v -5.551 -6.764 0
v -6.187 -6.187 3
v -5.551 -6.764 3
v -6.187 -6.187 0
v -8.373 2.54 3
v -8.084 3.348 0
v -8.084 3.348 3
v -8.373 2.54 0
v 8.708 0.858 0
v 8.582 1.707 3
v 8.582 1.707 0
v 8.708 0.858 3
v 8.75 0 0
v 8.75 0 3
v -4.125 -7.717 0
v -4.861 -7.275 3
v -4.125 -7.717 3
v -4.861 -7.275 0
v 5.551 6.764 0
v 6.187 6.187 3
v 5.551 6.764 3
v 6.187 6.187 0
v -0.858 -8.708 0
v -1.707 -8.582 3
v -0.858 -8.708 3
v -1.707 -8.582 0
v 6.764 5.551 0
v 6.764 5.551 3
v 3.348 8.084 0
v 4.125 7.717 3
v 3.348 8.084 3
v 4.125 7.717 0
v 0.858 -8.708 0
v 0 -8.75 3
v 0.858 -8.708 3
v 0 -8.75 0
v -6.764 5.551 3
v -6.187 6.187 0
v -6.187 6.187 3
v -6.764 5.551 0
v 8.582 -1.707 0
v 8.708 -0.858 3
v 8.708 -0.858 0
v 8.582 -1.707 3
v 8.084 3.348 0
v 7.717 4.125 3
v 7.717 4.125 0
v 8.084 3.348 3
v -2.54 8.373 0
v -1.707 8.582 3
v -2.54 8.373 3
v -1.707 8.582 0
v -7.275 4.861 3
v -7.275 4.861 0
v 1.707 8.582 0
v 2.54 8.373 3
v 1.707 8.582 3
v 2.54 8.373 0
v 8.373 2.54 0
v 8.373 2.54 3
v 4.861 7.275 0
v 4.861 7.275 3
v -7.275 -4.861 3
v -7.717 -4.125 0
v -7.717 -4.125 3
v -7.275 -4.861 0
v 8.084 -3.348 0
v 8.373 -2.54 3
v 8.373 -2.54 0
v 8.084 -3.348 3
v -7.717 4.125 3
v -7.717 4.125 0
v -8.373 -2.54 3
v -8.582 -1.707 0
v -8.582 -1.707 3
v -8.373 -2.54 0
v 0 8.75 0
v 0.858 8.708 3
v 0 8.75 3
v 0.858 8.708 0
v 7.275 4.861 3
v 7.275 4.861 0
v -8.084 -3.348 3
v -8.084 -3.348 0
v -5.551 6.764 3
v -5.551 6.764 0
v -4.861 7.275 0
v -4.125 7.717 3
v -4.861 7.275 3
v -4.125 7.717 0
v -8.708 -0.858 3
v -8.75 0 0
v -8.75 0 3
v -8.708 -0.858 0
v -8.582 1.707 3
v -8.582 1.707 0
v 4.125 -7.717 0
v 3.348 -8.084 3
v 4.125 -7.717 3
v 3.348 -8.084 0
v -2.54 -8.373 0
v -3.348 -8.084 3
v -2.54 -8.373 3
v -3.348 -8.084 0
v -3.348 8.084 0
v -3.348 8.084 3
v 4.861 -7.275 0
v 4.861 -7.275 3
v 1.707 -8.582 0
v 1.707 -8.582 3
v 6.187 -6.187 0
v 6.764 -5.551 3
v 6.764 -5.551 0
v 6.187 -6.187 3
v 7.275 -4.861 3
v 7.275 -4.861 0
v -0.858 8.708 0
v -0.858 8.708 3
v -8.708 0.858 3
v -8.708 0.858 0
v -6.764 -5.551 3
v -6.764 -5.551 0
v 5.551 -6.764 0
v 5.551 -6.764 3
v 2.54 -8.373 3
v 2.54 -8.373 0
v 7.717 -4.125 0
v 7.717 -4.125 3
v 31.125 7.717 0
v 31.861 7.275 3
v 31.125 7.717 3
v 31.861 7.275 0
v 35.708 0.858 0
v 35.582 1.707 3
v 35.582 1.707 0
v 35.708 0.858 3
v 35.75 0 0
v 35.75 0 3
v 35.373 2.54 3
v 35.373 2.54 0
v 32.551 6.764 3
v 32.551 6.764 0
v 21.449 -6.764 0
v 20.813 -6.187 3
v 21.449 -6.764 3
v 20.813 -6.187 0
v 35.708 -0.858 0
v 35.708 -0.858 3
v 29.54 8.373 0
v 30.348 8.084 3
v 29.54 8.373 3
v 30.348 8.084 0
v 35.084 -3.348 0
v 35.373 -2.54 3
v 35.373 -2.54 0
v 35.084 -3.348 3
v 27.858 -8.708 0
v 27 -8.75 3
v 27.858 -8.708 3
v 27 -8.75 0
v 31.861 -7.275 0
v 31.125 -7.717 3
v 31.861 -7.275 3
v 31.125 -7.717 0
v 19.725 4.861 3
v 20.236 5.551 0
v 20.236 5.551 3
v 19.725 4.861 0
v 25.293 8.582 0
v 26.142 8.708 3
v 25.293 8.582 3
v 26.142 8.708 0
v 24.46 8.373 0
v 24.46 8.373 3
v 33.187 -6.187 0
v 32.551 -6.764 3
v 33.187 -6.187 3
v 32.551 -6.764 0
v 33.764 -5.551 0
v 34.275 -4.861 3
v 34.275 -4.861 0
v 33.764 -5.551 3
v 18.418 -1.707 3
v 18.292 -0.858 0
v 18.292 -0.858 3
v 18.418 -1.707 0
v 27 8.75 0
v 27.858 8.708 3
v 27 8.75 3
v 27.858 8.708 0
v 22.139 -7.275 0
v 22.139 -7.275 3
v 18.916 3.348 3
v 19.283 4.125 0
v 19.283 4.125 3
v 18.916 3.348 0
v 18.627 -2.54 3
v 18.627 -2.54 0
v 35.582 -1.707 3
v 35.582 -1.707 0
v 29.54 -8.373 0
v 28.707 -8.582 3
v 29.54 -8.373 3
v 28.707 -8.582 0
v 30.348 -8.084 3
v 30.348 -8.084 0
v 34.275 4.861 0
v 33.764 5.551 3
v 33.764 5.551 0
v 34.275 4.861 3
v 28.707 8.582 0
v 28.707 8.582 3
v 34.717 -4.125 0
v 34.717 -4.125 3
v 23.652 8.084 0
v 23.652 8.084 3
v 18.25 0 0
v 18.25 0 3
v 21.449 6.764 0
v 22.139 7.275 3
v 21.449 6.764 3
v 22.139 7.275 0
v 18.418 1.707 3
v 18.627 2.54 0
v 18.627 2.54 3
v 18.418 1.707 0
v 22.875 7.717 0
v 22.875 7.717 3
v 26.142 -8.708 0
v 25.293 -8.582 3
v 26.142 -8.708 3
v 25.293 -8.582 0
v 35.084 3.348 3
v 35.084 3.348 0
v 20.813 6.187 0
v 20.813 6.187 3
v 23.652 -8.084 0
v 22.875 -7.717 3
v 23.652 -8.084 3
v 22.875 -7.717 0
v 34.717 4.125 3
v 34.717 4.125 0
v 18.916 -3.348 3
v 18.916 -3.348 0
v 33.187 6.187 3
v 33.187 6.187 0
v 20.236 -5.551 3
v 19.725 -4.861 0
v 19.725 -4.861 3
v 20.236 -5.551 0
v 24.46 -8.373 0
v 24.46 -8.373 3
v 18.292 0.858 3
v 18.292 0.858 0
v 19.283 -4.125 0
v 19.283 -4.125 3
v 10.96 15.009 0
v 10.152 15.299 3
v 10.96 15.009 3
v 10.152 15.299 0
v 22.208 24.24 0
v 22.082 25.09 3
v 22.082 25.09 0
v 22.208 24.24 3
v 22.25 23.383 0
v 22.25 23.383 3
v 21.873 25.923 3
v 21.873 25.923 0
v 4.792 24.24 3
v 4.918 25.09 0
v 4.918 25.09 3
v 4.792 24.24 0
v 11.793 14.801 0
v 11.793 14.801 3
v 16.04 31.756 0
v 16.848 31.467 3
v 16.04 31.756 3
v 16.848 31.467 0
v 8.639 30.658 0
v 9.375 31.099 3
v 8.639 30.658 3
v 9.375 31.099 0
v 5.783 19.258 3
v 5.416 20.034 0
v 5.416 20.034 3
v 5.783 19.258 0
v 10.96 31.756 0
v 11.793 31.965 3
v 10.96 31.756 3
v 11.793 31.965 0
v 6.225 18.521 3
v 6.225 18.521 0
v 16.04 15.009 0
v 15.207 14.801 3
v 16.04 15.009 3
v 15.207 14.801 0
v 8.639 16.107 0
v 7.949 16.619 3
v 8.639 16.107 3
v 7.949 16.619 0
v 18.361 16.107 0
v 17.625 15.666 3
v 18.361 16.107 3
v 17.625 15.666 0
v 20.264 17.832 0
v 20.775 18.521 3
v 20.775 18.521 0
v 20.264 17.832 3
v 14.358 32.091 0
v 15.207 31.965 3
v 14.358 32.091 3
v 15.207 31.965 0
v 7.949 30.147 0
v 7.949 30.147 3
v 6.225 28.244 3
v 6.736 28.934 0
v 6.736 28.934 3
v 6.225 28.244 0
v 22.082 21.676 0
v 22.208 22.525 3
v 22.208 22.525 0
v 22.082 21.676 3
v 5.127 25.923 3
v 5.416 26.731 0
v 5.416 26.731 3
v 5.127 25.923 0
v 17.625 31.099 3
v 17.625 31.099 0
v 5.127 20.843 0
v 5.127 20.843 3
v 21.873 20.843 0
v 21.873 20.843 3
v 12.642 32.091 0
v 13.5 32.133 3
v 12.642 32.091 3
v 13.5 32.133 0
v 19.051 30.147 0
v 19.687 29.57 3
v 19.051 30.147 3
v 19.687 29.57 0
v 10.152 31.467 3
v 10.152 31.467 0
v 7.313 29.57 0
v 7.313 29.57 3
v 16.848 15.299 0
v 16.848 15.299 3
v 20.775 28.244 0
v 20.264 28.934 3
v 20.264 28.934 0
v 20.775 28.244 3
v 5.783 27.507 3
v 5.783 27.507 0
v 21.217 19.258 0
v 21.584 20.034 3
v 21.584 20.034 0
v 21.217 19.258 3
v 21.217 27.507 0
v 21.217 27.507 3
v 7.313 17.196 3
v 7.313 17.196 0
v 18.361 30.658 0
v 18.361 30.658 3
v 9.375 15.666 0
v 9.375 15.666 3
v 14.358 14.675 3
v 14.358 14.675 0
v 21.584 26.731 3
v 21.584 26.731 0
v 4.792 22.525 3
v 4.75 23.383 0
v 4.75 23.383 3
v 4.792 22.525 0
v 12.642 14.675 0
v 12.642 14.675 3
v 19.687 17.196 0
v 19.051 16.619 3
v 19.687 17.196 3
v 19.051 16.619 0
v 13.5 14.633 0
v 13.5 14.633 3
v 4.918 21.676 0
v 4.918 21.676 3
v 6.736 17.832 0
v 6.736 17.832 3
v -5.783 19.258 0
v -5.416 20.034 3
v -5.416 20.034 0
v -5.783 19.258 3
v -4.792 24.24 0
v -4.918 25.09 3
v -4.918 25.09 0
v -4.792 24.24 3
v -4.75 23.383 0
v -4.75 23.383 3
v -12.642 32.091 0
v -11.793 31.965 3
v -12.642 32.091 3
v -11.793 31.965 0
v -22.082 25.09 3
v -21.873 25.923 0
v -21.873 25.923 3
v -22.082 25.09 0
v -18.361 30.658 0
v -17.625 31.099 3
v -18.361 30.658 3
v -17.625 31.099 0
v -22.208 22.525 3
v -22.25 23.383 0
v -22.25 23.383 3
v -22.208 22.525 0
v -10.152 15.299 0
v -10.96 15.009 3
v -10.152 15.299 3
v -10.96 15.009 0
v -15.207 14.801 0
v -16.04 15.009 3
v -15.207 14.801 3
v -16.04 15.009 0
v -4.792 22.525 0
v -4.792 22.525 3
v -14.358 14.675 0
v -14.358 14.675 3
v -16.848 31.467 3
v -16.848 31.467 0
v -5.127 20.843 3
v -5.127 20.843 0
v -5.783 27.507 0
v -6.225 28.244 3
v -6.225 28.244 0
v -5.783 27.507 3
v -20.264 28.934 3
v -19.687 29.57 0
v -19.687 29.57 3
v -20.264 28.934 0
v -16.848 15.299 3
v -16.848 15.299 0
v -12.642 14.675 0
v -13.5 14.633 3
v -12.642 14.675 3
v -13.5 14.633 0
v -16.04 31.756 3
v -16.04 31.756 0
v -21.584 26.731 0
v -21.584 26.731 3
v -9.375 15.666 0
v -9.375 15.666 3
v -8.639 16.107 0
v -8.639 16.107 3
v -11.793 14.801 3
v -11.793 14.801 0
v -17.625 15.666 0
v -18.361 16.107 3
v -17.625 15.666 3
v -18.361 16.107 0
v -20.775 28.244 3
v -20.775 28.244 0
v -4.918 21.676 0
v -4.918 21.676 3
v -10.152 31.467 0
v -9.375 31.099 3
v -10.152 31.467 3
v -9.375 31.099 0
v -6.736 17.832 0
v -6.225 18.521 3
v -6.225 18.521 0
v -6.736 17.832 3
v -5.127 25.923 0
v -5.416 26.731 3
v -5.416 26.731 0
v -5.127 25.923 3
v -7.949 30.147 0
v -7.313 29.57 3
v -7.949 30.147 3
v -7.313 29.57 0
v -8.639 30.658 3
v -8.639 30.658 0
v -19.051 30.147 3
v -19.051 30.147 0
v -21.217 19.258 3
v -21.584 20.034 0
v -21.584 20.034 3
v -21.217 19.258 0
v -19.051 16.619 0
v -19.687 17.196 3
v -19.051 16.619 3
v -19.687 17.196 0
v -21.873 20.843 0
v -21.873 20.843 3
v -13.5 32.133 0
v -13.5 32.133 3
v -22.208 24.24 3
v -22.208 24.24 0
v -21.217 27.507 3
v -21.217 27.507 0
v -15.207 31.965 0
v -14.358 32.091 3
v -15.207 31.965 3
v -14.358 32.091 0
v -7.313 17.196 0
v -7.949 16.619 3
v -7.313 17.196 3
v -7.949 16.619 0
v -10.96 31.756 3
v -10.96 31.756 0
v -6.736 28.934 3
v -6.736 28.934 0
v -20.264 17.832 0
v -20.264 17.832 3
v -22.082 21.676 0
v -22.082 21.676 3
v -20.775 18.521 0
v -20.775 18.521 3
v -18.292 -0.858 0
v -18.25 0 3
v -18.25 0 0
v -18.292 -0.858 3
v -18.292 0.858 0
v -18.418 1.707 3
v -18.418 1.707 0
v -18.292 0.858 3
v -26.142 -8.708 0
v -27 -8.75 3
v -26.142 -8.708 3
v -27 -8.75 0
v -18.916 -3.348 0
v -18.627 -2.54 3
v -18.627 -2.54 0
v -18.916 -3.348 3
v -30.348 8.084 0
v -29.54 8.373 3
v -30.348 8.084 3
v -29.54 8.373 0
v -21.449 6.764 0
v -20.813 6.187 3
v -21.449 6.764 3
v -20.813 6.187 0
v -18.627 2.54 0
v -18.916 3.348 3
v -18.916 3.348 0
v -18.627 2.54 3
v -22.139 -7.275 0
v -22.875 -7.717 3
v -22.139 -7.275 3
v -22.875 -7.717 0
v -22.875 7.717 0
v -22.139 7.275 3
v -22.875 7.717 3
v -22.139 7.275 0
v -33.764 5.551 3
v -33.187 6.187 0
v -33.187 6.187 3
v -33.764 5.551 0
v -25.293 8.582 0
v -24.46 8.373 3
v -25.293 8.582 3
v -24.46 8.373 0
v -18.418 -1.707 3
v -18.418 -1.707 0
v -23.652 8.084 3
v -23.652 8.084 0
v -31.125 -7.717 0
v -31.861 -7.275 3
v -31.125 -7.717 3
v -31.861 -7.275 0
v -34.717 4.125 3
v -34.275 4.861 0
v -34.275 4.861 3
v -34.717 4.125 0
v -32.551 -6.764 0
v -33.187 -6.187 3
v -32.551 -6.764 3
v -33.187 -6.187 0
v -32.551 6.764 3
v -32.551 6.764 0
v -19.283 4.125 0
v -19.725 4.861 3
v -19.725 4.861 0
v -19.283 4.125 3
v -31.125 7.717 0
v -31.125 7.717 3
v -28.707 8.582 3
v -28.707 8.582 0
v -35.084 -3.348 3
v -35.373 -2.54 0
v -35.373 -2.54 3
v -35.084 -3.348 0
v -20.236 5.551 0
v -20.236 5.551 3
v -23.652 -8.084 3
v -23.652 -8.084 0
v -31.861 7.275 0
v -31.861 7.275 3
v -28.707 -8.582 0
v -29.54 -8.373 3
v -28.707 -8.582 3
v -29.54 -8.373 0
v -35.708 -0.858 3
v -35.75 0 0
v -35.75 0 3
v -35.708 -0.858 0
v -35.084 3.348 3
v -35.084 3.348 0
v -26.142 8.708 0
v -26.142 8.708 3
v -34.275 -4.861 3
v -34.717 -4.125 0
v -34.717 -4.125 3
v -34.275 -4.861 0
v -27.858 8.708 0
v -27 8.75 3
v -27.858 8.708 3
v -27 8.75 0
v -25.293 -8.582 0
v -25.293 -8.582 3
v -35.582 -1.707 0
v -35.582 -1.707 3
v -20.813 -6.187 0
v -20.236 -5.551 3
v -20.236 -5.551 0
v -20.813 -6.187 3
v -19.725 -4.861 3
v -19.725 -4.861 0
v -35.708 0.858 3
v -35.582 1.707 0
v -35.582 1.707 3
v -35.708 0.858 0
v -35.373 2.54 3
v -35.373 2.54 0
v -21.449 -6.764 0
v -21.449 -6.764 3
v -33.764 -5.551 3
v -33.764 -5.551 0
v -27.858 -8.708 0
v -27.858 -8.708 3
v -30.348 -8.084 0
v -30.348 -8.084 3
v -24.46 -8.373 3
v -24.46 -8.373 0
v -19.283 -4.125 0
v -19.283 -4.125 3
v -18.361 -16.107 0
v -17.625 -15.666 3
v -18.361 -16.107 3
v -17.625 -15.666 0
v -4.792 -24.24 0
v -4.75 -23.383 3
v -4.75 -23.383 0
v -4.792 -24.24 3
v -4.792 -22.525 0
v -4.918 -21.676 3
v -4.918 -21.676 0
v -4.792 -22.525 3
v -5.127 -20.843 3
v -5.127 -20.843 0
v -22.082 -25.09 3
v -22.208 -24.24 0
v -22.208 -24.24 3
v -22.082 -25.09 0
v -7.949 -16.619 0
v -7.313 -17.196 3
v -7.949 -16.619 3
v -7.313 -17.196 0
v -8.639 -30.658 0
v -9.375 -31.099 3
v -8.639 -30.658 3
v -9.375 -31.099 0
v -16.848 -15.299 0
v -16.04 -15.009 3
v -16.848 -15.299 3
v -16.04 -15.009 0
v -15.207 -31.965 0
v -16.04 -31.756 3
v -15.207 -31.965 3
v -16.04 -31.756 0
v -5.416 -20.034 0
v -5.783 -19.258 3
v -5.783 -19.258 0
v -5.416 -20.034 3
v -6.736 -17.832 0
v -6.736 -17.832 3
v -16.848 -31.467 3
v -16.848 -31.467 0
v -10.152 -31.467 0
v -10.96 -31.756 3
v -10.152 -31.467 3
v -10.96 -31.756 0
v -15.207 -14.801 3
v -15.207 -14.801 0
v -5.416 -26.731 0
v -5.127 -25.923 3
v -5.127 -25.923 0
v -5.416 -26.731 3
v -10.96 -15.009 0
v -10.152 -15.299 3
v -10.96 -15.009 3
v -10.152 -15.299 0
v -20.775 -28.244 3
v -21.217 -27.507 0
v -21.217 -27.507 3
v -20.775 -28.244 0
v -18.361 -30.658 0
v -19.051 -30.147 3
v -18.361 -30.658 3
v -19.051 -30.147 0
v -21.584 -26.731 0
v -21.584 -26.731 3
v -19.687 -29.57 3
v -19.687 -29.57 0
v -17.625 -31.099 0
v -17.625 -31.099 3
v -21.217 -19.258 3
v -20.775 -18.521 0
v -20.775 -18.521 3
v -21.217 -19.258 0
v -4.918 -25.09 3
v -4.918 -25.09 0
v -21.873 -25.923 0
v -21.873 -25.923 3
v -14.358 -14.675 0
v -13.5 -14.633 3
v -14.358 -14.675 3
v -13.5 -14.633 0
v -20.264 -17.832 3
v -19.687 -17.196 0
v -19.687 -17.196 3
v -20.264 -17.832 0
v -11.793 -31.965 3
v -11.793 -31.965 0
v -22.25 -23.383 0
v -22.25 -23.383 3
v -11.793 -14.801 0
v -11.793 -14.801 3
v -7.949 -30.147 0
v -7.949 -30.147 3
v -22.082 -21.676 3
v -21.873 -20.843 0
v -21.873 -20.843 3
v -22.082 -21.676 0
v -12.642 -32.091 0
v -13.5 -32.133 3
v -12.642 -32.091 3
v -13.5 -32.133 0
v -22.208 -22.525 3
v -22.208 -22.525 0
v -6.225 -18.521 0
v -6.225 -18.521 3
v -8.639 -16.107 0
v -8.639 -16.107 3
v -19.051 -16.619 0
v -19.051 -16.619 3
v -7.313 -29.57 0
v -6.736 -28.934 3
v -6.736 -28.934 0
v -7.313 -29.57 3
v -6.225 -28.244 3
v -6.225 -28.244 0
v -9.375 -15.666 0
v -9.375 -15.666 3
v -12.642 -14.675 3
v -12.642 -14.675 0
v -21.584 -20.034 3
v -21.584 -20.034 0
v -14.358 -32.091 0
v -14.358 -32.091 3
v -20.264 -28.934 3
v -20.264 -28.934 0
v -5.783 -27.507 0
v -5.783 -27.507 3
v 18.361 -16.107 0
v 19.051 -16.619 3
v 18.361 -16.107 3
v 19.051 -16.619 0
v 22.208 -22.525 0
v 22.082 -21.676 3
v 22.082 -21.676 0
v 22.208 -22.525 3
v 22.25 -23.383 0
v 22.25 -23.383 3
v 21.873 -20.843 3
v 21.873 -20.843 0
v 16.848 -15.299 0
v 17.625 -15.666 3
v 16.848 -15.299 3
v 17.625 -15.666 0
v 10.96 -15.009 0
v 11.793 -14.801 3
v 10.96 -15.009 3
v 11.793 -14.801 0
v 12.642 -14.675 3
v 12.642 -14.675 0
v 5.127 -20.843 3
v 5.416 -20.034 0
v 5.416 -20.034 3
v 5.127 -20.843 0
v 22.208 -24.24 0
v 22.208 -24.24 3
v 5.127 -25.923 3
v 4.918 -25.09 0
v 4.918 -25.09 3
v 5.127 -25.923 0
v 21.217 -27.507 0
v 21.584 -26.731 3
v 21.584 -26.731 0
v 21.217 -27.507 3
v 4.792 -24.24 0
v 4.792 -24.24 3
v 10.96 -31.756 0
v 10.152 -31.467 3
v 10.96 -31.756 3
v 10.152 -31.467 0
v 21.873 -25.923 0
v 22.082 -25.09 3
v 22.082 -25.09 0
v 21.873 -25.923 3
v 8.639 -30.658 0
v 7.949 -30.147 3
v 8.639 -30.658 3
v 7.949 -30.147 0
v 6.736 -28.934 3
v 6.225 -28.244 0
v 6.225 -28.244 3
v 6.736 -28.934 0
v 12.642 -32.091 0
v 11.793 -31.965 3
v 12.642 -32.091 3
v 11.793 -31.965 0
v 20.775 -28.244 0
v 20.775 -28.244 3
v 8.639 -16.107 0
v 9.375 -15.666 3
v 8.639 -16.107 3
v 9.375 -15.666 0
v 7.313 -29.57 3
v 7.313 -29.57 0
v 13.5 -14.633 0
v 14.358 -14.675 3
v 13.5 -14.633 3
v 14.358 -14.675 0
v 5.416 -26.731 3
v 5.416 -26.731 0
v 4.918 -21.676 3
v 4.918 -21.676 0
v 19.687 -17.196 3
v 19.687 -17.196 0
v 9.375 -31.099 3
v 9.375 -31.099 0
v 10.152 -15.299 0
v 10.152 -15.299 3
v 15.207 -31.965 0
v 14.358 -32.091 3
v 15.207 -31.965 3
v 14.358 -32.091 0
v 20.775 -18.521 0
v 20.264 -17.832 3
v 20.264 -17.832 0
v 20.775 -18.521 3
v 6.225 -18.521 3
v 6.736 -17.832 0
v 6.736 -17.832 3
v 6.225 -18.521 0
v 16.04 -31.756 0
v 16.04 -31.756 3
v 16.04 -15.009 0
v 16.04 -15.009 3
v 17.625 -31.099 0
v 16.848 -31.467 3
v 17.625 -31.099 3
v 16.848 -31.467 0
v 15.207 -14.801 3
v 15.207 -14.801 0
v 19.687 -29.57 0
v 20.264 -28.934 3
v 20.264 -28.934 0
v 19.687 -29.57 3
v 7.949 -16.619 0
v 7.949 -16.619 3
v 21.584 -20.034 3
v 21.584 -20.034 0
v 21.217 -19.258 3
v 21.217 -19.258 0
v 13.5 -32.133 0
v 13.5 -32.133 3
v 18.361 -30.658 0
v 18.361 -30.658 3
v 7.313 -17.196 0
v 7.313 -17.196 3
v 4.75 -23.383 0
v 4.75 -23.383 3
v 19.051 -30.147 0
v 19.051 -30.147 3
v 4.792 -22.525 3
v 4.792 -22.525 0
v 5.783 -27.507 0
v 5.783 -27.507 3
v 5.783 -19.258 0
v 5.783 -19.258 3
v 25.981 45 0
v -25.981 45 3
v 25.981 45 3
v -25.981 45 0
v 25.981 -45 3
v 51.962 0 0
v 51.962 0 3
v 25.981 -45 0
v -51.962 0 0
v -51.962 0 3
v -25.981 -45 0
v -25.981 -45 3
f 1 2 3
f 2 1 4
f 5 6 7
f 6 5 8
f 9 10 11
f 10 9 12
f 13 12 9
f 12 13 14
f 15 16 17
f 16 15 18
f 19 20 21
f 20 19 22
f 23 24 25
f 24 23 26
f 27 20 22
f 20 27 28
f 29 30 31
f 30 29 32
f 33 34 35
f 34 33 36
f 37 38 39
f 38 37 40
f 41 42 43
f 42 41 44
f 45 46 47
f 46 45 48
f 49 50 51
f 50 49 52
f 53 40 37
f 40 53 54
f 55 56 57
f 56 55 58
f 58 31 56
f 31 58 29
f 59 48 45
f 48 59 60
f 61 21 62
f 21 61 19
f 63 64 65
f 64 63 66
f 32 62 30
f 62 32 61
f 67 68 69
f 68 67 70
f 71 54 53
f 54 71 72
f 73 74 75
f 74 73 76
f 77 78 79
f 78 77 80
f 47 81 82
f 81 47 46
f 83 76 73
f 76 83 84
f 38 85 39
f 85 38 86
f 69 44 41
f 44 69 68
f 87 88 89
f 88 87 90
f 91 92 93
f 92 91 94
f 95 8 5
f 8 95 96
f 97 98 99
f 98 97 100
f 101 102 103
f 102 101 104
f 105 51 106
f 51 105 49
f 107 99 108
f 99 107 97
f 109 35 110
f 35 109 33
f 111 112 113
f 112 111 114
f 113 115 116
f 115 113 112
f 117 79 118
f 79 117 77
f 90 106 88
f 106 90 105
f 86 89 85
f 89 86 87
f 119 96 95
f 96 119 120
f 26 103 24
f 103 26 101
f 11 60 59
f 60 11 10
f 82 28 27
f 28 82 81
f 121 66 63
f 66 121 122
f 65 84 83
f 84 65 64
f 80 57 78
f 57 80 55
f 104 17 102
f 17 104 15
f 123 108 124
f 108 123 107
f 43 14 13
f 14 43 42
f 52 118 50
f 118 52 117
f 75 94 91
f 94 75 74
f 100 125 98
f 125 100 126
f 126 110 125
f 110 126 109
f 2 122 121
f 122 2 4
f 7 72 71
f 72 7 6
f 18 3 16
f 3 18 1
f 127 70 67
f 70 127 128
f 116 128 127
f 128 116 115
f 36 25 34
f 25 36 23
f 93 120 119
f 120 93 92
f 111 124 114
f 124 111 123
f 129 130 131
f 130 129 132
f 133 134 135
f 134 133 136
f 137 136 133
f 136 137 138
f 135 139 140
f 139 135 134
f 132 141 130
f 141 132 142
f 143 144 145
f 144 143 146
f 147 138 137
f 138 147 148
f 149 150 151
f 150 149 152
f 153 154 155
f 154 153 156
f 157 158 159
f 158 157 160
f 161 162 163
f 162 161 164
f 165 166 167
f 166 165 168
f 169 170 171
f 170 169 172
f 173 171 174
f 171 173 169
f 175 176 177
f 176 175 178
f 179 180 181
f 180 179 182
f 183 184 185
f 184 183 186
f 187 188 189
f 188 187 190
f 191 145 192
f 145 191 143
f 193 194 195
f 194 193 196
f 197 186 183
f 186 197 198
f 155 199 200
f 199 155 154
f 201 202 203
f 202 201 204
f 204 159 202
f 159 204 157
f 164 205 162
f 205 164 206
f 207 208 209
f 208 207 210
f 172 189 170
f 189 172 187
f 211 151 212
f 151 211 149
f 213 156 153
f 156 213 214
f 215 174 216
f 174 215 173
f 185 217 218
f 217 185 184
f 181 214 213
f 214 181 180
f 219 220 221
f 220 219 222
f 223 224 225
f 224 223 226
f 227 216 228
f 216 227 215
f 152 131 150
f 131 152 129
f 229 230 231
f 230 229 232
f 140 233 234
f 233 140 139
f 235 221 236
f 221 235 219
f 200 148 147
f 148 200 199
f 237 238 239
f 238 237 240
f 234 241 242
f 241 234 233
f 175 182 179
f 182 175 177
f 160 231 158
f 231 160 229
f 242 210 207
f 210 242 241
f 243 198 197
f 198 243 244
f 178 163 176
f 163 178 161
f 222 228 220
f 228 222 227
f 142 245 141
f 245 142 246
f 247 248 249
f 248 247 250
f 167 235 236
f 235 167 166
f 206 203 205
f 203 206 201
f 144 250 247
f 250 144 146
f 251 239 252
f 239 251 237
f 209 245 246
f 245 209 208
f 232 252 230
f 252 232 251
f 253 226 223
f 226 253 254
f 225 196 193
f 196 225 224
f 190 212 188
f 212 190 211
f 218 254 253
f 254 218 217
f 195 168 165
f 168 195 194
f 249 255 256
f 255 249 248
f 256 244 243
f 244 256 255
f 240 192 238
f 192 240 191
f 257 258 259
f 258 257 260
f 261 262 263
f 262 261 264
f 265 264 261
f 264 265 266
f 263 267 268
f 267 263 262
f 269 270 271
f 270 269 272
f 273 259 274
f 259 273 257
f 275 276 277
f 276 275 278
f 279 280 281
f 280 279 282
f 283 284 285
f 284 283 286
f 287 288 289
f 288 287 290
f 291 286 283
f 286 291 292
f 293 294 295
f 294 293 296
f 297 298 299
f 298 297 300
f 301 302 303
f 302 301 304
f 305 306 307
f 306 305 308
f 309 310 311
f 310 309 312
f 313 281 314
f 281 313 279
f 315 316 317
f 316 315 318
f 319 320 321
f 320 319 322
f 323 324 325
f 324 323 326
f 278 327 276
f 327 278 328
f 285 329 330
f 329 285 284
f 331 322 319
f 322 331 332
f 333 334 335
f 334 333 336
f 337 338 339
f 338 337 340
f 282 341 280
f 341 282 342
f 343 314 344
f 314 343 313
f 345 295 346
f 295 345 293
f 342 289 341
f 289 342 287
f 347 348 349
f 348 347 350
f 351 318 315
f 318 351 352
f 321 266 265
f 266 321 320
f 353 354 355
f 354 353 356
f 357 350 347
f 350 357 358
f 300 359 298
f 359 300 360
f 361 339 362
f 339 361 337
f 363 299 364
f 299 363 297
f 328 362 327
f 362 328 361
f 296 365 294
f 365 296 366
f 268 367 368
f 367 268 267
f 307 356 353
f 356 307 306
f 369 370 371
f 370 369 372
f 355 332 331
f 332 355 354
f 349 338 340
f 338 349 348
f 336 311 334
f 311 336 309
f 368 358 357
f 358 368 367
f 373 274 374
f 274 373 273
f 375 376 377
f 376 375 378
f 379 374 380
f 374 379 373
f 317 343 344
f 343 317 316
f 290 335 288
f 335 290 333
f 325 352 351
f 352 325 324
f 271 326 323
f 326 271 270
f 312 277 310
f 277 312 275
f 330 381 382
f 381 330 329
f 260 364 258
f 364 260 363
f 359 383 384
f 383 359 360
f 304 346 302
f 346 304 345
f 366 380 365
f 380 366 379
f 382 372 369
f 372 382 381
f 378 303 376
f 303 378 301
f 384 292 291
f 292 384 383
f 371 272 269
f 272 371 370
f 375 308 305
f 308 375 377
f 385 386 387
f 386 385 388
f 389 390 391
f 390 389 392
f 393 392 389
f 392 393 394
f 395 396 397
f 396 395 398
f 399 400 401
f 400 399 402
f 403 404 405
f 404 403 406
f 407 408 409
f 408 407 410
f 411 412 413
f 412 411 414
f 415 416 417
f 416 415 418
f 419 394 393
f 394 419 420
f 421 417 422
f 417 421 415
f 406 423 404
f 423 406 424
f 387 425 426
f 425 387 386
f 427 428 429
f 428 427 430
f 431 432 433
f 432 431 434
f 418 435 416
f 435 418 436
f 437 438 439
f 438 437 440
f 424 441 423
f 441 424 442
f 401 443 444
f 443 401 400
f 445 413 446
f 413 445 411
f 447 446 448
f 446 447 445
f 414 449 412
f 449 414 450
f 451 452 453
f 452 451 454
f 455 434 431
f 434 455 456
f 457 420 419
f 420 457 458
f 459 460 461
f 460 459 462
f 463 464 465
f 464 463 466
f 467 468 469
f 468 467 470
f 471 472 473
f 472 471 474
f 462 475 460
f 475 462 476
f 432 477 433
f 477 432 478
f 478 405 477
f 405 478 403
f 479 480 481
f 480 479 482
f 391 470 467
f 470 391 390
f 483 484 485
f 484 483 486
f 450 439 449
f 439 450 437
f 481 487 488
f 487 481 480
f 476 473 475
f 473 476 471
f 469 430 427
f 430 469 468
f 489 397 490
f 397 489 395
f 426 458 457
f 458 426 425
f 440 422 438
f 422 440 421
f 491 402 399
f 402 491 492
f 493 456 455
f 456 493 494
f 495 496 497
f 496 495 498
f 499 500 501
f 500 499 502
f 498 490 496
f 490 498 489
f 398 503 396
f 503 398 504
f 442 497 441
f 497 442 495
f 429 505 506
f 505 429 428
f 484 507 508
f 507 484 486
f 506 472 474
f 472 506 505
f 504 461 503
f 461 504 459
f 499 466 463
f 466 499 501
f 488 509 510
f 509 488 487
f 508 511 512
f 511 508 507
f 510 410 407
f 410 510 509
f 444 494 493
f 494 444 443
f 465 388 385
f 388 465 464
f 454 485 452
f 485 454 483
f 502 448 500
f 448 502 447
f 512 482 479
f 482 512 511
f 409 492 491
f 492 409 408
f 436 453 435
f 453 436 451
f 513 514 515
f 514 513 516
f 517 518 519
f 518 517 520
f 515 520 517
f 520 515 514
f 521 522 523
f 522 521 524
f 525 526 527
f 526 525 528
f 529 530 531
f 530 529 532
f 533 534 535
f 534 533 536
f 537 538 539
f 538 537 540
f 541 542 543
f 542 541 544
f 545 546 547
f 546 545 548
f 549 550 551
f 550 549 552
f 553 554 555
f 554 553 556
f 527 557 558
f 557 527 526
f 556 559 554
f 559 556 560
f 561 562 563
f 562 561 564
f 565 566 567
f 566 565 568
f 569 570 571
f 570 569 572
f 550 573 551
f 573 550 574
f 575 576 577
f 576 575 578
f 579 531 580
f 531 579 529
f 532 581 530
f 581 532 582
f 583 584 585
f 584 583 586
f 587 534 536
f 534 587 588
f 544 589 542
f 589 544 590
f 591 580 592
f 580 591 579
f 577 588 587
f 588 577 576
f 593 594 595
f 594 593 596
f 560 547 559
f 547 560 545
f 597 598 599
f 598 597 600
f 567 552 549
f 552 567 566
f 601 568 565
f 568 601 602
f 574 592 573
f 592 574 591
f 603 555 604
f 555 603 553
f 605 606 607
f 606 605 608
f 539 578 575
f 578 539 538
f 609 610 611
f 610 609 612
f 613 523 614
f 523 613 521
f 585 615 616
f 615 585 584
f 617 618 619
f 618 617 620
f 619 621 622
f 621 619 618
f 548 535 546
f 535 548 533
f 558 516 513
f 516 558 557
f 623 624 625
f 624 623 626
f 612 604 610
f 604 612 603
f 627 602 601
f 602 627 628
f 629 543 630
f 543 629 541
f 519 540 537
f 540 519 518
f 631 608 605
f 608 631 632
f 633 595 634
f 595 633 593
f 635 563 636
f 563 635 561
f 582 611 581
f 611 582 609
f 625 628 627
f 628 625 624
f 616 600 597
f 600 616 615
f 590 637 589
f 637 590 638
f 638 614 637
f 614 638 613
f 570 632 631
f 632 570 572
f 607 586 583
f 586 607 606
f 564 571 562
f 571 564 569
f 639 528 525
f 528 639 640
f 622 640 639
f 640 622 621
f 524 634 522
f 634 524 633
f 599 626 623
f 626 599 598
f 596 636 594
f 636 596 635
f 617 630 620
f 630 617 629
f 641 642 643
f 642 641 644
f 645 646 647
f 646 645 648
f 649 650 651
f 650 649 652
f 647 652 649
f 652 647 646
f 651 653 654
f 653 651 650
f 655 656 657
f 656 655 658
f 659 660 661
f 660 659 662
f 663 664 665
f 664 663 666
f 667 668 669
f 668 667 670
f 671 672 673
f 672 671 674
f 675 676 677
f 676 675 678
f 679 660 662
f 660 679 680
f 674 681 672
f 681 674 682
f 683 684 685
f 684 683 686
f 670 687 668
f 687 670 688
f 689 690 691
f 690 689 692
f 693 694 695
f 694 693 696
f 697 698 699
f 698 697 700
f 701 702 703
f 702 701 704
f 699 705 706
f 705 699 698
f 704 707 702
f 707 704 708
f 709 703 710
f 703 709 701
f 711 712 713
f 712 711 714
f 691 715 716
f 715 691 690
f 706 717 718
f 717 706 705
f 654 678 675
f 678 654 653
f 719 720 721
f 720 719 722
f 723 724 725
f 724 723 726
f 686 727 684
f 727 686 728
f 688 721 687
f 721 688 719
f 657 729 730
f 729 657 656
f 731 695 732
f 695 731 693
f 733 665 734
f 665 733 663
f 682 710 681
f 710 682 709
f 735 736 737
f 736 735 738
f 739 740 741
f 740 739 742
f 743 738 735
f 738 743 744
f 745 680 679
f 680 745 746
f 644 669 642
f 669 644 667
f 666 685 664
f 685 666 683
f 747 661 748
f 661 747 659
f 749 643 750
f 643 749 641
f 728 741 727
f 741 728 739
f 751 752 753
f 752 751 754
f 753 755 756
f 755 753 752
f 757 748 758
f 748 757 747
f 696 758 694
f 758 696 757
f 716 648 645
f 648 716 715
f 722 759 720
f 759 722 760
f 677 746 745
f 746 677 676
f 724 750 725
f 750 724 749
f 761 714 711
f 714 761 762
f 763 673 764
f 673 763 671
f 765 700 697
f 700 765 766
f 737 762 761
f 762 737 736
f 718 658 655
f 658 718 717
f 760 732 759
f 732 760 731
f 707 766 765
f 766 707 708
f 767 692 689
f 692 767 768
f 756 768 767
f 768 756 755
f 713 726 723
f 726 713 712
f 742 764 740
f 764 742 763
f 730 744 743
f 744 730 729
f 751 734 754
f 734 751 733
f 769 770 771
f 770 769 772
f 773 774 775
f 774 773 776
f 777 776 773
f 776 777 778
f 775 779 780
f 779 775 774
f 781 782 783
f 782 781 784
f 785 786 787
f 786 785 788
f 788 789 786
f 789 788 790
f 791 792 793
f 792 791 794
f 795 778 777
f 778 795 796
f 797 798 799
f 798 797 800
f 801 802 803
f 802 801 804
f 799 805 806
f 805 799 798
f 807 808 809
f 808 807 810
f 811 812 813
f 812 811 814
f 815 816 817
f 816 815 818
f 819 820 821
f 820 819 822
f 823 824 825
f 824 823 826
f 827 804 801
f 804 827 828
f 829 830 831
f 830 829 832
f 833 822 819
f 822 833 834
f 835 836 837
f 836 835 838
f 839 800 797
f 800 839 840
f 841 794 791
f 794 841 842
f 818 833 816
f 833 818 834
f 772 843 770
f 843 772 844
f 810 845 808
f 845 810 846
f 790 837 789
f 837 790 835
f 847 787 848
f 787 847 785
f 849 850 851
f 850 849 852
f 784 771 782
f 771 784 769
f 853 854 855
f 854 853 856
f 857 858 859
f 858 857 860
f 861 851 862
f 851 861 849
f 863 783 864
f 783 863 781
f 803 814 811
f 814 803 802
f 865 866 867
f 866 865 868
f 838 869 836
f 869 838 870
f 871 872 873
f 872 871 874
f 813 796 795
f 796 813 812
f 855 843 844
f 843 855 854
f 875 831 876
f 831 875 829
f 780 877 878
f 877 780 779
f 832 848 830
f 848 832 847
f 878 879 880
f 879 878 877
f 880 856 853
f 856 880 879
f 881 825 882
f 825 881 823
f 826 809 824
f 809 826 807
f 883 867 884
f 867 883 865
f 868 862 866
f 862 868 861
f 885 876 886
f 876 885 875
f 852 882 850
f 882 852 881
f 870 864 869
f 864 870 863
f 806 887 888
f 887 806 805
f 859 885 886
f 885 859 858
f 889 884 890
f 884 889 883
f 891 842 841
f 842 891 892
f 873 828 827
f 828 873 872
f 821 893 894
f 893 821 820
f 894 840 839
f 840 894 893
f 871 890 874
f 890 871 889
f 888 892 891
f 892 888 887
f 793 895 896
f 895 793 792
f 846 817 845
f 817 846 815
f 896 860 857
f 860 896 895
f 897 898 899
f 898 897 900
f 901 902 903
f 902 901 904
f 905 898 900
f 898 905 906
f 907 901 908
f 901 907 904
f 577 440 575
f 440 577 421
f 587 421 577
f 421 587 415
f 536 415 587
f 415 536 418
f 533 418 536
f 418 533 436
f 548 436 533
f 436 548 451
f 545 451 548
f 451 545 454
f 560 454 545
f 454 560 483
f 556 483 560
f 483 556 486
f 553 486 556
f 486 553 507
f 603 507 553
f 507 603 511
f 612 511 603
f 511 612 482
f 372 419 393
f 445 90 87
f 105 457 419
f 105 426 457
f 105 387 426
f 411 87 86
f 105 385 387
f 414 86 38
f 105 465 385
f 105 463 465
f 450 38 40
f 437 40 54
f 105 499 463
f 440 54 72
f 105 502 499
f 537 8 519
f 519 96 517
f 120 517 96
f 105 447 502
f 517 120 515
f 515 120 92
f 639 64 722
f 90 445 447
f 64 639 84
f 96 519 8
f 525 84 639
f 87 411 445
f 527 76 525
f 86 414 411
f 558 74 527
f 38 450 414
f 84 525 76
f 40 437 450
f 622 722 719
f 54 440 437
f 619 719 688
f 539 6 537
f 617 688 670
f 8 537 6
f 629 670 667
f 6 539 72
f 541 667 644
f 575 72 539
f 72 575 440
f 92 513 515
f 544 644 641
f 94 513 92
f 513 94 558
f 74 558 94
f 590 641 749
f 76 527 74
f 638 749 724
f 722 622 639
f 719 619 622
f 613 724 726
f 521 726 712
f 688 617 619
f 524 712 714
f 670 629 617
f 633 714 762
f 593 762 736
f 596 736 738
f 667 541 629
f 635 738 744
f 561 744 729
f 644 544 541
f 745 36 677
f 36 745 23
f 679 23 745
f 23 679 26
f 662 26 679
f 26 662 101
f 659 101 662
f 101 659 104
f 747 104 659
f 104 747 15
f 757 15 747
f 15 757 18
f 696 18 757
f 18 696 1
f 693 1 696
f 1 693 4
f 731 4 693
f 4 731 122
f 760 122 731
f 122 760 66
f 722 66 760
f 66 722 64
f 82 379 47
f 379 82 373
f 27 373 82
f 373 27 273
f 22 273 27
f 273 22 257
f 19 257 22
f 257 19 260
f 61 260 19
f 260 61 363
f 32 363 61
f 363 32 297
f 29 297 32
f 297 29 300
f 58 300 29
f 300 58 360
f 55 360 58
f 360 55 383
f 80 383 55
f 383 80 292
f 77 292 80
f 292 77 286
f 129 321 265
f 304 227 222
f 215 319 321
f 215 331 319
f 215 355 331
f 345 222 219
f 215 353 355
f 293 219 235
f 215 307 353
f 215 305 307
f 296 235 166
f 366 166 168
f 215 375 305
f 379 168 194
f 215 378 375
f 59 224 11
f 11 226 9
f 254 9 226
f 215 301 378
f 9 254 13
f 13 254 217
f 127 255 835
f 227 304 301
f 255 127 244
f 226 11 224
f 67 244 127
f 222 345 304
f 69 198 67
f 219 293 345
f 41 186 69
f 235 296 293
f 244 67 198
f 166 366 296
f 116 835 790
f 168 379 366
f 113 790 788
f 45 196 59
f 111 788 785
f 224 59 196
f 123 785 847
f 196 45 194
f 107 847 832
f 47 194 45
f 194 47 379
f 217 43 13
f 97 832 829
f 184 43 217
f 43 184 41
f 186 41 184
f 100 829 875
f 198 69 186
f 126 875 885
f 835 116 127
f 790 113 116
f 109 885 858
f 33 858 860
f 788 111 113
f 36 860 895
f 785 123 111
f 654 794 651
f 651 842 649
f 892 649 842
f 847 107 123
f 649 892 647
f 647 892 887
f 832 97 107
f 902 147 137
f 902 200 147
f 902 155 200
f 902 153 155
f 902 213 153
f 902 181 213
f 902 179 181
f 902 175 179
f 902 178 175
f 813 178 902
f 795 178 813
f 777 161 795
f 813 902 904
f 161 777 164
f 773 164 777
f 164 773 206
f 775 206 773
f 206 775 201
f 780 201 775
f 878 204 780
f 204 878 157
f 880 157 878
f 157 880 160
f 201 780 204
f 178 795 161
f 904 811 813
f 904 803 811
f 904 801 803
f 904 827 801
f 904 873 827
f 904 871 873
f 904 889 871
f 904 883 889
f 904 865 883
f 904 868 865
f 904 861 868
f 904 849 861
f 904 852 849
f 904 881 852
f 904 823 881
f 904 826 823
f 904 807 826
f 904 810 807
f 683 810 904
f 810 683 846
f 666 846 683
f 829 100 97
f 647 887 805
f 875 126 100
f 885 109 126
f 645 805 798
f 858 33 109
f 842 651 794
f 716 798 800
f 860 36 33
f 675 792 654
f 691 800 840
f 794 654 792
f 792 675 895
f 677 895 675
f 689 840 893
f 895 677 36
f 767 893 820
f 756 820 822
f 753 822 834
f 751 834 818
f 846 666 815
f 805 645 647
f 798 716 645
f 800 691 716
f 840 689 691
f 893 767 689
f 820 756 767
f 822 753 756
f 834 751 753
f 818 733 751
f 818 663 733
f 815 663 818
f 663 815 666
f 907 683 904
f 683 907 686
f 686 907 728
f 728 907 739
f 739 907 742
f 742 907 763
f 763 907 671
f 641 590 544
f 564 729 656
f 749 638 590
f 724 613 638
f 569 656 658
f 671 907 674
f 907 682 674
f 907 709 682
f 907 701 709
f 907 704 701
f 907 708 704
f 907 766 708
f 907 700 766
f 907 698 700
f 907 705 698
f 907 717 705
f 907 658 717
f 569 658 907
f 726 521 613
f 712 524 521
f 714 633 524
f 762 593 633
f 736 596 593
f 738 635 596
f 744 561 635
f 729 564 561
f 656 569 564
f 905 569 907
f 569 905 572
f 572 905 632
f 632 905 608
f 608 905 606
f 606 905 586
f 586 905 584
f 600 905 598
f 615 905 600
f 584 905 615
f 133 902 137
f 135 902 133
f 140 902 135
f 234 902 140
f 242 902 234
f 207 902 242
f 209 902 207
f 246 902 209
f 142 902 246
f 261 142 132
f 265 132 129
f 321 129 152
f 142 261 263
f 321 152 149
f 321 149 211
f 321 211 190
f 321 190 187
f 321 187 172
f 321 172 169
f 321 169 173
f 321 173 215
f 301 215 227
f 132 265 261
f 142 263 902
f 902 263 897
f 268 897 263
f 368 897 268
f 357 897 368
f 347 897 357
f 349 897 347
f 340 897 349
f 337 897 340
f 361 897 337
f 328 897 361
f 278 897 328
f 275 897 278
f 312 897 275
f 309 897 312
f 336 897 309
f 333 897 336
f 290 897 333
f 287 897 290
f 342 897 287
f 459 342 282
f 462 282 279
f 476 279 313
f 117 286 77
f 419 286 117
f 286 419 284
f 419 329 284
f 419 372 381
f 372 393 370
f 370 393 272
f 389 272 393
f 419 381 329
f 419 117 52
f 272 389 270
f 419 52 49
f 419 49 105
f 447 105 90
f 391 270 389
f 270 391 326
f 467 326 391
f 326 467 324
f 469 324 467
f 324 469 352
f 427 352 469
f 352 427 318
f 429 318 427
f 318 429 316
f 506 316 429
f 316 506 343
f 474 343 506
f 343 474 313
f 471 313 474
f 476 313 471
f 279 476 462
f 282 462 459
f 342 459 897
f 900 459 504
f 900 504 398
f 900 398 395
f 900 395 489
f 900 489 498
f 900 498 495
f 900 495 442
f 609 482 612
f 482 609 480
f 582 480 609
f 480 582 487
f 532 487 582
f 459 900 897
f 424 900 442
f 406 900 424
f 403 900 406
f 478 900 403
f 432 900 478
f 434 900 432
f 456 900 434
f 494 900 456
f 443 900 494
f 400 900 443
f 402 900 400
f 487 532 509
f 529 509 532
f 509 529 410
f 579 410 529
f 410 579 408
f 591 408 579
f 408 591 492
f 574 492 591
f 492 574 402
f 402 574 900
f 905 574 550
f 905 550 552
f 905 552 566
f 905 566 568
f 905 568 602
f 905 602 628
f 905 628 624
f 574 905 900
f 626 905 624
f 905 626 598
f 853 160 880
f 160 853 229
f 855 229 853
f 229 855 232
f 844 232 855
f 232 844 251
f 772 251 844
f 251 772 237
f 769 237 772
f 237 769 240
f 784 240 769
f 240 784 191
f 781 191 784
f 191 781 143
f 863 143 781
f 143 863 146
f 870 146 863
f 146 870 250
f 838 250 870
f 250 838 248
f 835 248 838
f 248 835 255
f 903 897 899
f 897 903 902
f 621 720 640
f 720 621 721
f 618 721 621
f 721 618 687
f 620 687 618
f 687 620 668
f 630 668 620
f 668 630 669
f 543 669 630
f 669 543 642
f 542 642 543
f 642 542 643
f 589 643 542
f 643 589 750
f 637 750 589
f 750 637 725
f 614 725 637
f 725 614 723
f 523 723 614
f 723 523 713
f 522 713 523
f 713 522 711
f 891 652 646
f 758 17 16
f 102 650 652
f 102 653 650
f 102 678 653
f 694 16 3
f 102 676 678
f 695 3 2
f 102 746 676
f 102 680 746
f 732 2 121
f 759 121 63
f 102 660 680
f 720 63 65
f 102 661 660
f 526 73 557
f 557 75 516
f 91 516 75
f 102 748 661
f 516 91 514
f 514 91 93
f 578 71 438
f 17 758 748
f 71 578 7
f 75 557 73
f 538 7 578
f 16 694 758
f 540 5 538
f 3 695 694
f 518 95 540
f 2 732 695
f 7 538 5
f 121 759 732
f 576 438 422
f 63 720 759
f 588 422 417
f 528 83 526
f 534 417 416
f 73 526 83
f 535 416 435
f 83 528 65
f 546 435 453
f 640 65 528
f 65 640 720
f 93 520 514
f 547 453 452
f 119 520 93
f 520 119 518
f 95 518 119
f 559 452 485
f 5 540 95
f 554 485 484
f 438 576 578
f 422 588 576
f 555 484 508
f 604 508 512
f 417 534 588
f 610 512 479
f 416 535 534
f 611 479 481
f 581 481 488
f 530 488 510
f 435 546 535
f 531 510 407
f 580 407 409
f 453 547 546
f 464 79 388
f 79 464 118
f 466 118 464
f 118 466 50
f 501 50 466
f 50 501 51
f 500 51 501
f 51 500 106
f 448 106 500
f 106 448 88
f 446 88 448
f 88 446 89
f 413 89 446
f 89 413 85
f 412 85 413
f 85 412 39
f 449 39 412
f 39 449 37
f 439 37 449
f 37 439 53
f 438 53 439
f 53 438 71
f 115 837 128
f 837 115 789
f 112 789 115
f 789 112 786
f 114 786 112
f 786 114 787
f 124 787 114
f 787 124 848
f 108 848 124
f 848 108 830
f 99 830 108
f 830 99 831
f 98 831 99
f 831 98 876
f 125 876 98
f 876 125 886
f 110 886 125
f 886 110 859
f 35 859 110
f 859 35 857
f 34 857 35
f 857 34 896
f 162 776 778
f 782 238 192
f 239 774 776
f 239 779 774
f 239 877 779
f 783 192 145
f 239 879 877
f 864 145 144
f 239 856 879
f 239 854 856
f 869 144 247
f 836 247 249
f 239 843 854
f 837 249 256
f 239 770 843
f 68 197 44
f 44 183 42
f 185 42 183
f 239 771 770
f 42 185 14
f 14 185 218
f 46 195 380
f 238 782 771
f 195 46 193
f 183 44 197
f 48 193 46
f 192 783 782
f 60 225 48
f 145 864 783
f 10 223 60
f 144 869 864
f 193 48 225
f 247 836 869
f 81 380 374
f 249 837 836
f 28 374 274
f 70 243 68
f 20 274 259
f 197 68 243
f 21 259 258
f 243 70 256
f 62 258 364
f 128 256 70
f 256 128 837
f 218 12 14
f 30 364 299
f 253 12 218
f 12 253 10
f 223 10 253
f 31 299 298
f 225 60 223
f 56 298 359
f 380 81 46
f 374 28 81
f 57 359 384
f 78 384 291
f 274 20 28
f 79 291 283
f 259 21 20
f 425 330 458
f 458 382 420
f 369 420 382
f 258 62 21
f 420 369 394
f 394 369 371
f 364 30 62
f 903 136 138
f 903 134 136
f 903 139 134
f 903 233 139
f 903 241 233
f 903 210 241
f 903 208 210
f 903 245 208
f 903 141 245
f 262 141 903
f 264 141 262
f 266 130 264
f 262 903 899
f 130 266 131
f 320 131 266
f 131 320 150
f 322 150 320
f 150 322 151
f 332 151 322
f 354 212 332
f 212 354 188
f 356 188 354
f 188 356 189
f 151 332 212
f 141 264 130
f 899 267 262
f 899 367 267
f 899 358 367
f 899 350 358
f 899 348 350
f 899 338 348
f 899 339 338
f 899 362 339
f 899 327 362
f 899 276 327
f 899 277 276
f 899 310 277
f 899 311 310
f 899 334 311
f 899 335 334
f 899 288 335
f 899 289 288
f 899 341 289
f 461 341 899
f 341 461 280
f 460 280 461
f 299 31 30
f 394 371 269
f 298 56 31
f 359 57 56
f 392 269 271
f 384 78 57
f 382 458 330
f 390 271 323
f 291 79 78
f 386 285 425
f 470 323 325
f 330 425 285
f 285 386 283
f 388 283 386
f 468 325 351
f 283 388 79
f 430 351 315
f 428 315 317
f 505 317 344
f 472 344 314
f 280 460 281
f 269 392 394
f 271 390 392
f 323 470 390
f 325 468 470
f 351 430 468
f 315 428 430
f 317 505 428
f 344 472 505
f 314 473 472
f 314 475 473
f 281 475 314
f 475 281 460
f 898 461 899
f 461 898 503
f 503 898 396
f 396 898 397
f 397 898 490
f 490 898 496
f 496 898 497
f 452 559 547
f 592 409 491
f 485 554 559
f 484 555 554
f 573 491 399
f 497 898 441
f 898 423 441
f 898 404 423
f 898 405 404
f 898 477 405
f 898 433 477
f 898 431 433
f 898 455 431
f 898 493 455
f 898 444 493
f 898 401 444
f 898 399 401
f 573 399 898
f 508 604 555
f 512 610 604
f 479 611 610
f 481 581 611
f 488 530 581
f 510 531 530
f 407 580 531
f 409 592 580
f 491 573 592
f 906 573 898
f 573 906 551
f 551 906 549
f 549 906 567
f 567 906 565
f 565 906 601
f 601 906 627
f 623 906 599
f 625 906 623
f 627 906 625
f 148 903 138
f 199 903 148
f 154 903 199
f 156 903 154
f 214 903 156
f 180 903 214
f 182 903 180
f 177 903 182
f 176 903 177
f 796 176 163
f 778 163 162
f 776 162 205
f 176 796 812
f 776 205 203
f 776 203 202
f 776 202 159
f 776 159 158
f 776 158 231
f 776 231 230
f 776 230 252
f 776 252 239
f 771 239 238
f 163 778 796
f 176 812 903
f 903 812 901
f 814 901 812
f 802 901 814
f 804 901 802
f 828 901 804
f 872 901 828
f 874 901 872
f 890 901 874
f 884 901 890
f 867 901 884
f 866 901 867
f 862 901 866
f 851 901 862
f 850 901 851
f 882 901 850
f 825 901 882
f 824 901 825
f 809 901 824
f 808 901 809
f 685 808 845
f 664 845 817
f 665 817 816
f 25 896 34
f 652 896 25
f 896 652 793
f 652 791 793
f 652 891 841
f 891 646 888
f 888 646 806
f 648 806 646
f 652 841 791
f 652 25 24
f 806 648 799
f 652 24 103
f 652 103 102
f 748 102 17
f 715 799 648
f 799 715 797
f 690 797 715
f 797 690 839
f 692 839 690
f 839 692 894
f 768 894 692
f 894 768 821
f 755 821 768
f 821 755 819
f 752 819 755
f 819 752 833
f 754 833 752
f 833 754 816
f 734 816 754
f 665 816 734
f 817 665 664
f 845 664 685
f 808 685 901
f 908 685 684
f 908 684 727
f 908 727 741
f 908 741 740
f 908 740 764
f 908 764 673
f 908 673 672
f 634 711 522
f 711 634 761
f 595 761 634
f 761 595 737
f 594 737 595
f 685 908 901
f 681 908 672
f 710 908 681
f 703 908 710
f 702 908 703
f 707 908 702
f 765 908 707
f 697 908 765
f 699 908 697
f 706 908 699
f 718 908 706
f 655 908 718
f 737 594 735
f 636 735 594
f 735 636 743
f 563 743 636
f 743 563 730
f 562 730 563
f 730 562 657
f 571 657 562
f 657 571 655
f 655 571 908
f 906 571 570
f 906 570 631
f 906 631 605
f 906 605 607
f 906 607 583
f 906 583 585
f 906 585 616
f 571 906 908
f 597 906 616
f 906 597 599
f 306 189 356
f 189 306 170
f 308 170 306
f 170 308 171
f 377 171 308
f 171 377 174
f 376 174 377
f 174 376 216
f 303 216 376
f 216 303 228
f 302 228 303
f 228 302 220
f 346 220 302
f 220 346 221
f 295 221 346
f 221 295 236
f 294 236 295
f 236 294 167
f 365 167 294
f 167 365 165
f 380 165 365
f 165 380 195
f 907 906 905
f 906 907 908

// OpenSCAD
// Float for 7 x 15 mL conical tubes, printed upside down (plate on bed, z=0..3)
$fn = 64;

// Plate (regular hexagon, 90 mm across flats, two flats parallel to X)
plate_af   = 90;   // across flats
plate_t    = 3;    // plate thickness (z 0..3)
plate_ap   = plate_af / 2;   // apothem = 45
plate_r    = plate_af / sqrt(3); // circumradius = 51.9615

// Holes: 17.5 mm through, 1 centre + 6 on 54 mm dia circle (first on +X)
hole_d     = 17.5;
hole_r     = hole_d / 2;   // 8.75
ring_d     = 54;
ring_r     = ring_d / 2;   // 27

// Sleeves: 2 mm wall -> 21.5 mm OD, rise to z=20
sleeve_od  = 21.5;
sleeve_r   = sleeve_od / 2; // 10.75
sleeve_h   = 20;

// Hexagonal skirt: 2 mm wall, 84 mm across flats outside (3 mm in from plate edge)
skirt_af   = 84;
skirt_ap   = skirt_af / 2;  // 42
skirt_r    = skirt_af / sqrt(3); // 48.4973
skirt_h    = 20;

// Helper: regular hexagon polygon (flat sides parallel to X, vertices at 0,60,...)
module hexagon(r) {
    polygon(points = [for (i = [0:5]) [r * cos(i * 60), r * sin(i * 60)]]);
}

// Hole centre positions (centre + 6 on 54 mm dia circle, first on +X)
hole_pos = [
    [0, 0],
    [ring_r, 0],
    [ring_r * cos(60),  ring_r * sin(60)],
    [ring_r * cos(120), ring_r * sin(120)],
    [ring_r * cos(180), ring_r * sin(180)],
    [ring_r * cos(240), ring_r * sin(240)],
    [ring_r * cos(300), ring_r * sin(300)]
];

// Cuts: each extends 1 mm past the faces it cuts (z -1 .. 21)
module hole_cut() {
    translate([0, 0, -1])
        cylinder(h = 22, r = hole_r, $fn = 64);
}

module sleeve_cut() {
    translate([0, 0, -1])
        cylinder(h = 22, r = sleeve_r, $fn = 64);
}

module skirt_cut() {
    translate([0, 0, -1])
        linear_extrude(height = 22)
            hexagon(skirt_r);
}

// Step 1: plate with 7 through-holes
module bored_plate() {
    difference() {
        translate([0, 0, 0])
            linear_extrude(height = plate_t)
                hexagon(plate_r);
        for (p = hole_pos)
            translate([p[0], p[1], 0])
                hole_cut();
    }
}

// Step 2: hexagonal skirt (84 AF, z 0..20) bored to 84 AF
//   The skirt bore only cuts the plate rim (42 < 45 apothem), NOT the sleeves,
//   because the sleeves are added in step 3 (after this difference).
module bored_skirt() {
    difference() {
        translate([0, 0, 0])
            linear_extrude(height = skirt_h)
                hexagon(skirt_r);
        skirt_cut();
    }
}

// Step 3: 7 sleeves (21.5 OD, z 0..20) each bored to 17.5
//   Added after the skirt bore so the 84 mm skirt cut cannot swallow them.
module bored_sleeves() {
    for (p = hole_pos)
        difference() {
            translate([p[0], p[1], 0])
                cylinder(h = sleeve_h, r = sleeve_r, $fn = 64);
            translate([p[0], p[1], 0])
                sleeve_cut();
        }
}

// Final float: plate + skirt + sleeves (sleeves added last to survive skirt bore)
union() {
    bored_plate();
    bored_skirt();
    bored_sleeves();
}
